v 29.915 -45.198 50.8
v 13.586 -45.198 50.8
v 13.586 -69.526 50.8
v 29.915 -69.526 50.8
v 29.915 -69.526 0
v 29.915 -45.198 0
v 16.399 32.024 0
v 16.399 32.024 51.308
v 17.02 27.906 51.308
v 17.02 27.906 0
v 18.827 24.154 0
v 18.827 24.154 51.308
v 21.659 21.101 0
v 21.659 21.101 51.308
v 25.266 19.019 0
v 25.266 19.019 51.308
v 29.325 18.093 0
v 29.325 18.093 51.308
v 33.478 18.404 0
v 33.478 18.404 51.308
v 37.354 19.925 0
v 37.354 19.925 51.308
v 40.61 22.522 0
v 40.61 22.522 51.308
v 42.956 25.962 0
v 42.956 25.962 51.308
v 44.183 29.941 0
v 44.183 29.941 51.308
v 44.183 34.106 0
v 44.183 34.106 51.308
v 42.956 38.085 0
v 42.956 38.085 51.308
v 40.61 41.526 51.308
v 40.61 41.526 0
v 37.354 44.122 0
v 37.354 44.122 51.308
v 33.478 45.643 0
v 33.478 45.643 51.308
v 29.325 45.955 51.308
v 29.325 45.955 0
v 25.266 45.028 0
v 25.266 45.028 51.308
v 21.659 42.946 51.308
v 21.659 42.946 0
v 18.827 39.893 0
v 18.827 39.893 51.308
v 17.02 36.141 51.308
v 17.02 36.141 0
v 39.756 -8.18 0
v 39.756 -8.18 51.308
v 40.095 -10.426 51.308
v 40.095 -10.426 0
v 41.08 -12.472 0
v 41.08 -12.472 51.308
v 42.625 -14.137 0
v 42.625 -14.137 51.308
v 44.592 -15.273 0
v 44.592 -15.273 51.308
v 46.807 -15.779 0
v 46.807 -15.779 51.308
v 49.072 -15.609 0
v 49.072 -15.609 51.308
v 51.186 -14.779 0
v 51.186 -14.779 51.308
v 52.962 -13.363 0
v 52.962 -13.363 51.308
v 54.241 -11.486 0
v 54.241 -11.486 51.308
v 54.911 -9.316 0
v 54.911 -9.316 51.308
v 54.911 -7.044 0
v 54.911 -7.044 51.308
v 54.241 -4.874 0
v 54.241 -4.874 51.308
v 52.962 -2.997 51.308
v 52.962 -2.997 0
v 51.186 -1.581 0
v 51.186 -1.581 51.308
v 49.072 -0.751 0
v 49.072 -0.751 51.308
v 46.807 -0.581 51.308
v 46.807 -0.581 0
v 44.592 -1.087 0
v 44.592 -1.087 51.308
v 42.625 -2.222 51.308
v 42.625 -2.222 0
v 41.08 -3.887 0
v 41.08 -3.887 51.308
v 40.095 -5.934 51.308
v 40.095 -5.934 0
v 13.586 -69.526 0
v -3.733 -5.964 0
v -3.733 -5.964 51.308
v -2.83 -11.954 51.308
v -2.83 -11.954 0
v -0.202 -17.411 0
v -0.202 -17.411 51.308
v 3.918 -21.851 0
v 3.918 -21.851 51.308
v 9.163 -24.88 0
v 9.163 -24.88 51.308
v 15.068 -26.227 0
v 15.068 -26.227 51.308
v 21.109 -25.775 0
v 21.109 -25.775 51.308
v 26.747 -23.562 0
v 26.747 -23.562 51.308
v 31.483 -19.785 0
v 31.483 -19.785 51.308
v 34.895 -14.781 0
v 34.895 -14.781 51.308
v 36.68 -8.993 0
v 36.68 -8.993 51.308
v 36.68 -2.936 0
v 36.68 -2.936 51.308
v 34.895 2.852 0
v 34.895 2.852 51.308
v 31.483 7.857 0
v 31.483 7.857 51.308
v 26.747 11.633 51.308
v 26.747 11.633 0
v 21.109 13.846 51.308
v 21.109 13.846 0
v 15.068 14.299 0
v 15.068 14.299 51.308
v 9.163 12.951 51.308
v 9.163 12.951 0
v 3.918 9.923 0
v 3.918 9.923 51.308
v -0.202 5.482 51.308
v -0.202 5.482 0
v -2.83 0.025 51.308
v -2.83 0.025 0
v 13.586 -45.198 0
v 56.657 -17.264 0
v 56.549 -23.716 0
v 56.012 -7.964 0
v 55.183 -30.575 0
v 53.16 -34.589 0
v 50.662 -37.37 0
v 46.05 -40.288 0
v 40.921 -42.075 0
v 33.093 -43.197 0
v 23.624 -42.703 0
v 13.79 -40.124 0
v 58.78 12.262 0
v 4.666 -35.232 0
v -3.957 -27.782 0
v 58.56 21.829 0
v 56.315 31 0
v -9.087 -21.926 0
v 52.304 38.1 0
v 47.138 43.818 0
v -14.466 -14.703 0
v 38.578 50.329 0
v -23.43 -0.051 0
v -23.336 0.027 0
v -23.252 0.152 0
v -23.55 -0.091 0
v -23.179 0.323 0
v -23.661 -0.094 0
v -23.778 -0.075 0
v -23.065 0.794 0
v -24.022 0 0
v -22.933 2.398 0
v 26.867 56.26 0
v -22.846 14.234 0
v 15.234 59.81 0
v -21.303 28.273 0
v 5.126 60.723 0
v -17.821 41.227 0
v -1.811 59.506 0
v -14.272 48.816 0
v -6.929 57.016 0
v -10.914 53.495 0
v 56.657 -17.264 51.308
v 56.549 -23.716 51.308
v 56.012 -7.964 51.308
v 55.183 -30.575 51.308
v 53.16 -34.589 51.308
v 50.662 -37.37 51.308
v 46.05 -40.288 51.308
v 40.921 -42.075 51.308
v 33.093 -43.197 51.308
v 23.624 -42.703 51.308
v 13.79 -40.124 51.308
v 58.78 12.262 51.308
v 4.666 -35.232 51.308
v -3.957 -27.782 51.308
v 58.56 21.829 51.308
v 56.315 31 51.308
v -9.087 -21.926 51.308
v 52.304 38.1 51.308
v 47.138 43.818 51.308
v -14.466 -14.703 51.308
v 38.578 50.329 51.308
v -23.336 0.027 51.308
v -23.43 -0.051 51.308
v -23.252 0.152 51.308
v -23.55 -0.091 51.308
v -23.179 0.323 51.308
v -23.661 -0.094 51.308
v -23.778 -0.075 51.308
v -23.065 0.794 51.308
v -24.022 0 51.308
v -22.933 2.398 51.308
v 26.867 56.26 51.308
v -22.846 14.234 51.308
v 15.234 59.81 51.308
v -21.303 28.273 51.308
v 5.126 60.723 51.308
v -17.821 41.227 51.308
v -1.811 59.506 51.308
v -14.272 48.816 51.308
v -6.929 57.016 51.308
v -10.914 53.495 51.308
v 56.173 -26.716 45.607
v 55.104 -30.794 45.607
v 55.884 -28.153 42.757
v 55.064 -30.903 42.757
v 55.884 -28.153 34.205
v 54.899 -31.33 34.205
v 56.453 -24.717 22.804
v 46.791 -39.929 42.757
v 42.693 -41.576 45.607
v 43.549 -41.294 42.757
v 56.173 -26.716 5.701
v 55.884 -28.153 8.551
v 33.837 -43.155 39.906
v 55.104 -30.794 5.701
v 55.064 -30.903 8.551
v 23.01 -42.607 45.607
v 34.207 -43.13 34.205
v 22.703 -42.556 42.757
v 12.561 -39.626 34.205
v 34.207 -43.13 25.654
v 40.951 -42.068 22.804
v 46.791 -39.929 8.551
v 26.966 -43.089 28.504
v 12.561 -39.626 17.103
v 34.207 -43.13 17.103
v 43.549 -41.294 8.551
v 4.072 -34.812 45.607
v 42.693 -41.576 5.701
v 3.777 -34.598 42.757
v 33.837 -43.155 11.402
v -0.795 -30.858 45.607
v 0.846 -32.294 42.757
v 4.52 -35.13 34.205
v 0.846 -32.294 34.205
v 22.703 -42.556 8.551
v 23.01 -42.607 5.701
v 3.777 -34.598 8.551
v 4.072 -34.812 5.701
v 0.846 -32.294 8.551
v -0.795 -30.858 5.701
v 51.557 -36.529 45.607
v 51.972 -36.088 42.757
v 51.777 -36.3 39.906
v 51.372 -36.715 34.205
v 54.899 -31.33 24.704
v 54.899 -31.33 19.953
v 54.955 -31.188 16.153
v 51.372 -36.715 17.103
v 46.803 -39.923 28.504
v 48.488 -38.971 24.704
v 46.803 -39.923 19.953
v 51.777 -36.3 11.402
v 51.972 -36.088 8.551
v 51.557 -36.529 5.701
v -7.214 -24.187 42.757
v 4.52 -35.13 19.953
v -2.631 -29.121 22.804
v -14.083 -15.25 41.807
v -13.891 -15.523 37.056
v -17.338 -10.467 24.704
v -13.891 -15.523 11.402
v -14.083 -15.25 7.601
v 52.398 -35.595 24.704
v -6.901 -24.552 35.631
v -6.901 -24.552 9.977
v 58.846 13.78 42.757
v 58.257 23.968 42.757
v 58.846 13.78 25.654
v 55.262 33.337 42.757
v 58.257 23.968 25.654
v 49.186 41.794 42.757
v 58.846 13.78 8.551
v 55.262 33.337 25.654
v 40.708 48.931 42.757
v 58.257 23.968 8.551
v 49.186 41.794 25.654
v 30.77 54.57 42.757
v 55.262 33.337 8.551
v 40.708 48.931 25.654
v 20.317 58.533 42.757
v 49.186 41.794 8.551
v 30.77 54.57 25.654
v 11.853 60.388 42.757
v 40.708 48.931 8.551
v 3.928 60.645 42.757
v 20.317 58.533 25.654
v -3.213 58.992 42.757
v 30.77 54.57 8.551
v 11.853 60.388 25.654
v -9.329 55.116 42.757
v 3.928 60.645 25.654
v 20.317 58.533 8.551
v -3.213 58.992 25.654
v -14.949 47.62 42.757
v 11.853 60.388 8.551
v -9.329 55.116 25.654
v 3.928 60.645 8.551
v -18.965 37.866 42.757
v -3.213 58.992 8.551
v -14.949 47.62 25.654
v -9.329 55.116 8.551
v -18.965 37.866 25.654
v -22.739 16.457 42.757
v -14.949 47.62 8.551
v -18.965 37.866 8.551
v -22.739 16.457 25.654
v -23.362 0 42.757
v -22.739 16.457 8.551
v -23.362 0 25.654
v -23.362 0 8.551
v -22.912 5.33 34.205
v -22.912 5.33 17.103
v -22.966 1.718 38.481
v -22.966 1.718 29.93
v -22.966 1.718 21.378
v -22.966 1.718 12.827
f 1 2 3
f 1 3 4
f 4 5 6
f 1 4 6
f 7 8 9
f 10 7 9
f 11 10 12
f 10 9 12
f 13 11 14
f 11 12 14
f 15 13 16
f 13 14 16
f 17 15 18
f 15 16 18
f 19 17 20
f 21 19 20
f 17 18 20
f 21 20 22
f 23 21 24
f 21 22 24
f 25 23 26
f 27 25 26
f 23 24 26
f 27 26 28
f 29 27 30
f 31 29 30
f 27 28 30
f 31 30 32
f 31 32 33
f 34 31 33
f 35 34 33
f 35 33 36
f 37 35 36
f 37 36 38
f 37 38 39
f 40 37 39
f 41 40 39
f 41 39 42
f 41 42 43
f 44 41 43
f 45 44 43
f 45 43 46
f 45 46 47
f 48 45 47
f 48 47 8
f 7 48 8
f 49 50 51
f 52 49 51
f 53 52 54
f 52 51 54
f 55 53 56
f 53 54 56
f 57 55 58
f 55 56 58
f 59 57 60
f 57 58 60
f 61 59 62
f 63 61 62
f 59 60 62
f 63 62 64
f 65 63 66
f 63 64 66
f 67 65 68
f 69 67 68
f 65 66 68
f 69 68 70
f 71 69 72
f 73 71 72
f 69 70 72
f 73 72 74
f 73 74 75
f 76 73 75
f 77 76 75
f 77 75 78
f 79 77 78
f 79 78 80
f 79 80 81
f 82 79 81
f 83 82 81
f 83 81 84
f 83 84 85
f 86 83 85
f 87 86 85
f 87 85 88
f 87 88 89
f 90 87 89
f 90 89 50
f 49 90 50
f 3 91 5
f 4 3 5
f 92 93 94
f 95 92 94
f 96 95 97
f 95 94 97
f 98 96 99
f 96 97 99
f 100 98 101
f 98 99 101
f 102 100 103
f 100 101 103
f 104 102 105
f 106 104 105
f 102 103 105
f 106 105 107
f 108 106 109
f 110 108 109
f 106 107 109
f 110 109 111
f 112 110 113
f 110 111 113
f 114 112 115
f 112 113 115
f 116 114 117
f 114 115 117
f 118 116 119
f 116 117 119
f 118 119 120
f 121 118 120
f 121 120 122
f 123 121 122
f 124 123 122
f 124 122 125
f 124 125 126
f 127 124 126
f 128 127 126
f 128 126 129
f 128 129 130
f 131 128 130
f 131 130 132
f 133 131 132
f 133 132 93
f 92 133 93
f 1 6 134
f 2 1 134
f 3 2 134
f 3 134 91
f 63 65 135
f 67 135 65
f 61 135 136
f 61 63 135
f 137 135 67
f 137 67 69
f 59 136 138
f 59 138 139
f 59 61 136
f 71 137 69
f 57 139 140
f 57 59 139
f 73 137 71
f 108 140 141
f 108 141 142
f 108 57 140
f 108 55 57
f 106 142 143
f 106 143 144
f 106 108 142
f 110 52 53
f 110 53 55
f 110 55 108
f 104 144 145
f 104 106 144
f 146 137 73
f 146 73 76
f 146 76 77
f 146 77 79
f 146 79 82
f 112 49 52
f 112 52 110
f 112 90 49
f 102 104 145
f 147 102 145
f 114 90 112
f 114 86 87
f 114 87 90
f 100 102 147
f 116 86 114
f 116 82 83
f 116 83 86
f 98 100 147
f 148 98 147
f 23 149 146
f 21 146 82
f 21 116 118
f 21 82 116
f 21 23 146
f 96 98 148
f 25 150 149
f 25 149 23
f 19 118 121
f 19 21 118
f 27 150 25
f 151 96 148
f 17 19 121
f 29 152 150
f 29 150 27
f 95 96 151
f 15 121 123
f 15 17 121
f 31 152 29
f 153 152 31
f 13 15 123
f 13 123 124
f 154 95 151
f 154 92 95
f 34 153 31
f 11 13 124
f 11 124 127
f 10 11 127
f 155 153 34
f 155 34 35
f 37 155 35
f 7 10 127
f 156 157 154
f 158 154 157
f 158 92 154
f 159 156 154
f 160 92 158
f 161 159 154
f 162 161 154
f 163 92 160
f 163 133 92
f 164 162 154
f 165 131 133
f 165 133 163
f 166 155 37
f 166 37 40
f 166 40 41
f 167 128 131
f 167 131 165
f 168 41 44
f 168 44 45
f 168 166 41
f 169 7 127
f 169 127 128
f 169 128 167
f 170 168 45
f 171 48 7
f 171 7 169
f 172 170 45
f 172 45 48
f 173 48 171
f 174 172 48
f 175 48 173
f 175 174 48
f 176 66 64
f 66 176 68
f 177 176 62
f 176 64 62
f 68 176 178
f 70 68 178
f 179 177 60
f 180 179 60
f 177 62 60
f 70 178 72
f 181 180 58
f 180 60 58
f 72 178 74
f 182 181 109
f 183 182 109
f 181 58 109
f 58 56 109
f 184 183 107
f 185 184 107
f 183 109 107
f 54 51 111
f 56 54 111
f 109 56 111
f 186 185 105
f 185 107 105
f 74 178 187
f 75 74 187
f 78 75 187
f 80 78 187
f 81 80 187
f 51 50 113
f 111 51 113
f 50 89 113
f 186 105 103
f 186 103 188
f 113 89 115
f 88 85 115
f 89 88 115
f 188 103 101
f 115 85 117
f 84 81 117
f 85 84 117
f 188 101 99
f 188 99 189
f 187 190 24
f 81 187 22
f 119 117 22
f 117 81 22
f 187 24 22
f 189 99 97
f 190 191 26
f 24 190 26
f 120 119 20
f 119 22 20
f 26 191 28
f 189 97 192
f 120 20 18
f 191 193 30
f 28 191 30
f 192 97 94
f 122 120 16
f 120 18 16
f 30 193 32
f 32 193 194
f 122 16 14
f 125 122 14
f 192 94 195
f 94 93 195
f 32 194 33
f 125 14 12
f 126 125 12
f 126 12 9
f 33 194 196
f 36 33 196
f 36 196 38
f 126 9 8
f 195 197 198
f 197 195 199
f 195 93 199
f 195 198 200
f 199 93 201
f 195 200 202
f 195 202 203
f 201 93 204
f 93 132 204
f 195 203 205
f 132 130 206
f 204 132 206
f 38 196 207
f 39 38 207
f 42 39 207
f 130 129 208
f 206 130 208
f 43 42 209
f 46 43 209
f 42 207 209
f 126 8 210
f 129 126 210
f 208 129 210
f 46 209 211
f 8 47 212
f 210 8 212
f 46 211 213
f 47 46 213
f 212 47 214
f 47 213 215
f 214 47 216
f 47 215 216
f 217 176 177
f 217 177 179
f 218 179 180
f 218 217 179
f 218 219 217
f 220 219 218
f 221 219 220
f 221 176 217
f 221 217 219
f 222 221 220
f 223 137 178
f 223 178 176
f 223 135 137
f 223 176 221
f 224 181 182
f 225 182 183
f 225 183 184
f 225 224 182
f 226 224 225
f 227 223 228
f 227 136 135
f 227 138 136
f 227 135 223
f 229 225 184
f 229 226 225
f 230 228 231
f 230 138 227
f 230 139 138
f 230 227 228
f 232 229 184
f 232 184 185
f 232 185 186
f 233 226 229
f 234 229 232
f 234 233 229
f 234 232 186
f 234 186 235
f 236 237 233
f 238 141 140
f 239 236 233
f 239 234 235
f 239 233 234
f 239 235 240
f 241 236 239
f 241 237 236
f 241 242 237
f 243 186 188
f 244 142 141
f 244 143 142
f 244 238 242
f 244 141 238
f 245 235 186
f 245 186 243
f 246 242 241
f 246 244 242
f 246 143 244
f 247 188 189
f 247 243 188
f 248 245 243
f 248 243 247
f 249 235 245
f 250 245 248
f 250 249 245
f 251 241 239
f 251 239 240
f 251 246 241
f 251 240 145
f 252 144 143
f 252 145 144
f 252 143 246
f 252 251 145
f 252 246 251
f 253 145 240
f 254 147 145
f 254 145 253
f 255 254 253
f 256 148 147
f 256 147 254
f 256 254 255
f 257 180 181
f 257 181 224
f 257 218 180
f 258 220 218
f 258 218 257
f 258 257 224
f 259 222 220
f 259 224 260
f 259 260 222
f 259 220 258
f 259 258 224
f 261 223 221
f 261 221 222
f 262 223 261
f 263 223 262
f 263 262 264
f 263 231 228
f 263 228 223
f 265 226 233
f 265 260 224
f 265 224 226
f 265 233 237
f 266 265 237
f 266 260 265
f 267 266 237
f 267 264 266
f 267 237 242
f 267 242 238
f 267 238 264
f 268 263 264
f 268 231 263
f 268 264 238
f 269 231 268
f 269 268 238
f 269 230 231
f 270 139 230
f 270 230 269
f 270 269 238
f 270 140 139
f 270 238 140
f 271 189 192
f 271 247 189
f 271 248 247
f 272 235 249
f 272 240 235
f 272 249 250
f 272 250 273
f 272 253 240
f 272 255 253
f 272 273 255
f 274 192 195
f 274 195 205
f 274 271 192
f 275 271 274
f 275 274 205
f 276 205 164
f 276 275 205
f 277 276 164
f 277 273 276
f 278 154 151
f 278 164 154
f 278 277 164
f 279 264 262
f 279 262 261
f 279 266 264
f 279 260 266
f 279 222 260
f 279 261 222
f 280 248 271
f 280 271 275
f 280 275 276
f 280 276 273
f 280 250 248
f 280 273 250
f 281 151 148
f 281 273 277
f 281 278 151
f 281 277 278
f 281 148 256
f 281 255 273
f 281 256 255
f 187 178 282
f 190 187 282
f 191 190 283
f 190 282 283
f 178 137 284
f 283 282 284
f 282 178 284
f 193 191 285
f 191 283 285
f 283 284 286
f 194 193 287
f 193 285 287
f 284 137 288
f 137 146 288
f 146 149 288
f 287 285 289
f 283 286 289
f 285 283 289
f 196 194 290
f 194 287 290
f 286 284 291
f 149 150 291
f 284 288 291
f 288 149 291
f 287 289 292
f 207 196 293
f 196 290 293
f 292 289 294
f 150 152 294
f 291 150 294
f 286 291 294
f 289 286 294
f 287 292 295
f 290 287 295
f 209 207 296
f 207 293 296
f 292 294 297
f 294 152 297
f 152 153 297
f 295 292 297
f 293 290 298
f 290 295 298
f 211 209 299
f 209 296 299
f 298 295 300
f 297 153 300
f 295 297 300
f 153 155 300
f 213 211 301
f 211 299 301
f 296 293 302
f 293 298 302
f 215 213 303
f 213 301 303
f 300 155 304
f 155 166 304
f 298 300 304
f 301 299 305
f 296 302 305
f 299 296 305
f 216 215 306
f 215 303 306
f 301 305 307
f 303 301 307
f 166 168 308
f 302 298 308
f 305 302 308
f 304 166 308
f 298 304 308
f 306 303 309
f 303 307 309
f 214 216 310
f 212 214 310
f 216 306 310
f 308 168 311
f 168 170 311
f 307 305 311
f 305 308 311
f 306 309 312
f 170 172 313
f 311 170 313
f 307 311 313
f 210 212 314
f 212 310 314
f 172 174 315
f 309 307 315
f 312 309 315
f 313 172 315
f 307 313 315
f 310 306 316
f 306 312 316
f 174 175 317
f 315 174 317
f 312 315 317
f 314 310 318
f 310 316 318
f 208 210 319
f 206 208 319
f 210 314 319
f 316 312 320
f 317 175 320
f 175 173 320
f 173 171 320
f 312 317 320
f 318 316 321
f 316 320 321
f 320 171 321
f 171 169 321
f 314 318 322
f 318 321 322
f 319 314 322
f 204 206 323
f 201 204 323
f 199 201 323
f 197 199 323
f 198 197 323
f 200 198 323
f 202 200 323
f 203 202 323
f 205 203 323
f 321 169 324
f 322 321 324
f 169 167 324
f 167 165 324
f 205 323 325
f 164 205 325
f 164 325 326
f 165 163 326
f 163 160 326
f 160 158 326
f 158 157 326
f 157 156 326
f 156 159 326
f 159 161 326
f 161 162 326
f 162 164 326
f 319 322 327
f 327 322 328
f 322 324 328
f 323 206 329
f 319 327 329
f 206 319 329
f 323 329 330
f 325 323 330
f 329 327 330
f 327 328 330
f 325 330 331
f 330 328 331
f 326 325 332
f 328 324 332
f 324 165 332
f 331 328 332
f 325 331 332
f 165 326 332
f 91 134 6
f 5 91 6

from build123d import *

# Parameters (mm, degrees)
F1_DEPTH = 51.308
F3_D     = 40.64
F5_D     = 15.24
F7_D     = 27.94
F9_DEPTH = 50.8


with BuildPart() as f1:
    # F0 (on Top) → F1 (new body)
    with BuildSketch(Plane.XY):
        with BuildLine():
            add(Edge.make_bspline(
                [(56.0124404728, -7.9644387588), (56.9753590395, -19.1102463597), (59.0514475401, -43.1410250669), (5.3467472158, -46.7995741419), (-13.7153867683, -16.4237299021), (-24.0219756961, 0)],
                knots=[0, 0, 0, 0, 0.284344005, 0.6130563262, 1, 1, 1, 1], degree=3))
            add(Edge.make_bspline(
                [(56.0124404728, -7.9644387588), (58.6142836782, 6.7744605313), (63.873201795, 36.5651352116), (21.6916803423, 61.9672567425), (-14.5502762604, 61.8700733376), (-24.4595201188, 19.0299783517), (-22.3291566988, -0.582370954), (-23.7799796516, -0.0832525318), (-24.0219756961, 0)],
                knots=[0, 0, 0, 0, 0.2162506935, 0.4370919382, 0.6208959046, 0.8361237682, 0.9726655828, 1, 1, 1, 1], degree=3))
        make_face()
    extrude(amount=F1_DEPTH)

    # F3 (through all)
    with Locations(Plane(origin=(0, 0, 0), x_dir=(1, 0, 0), z_dir=(0, 0, -1))):
        with Locations((16.5869705379, 5.9642544948)):
            Hole(F3_D / 2)

    # F5 (through all)
    with Locations(Plane(origin=(0, 0, 0), x_dir=(1, 0, 0), z_dir=(0, 0, -1))):
        with Locations((47.3761111498, 8.1799058244)):
            Hole(F5_D / 2)

    # F7 (through all)
    with Locations(Plane(origin=(0, 0, 0), x_dir=(1, 0, 0), z_dir=(0, 0, -1))):
        with Locations((30.3693879396, -32.0235900581)):
            Hole(F7_D / 2)


with BuildPart() as f9:
    # F8 (on Top) → F9 (new body)
    with BuildSketch(Plane.XY):
        Polygon((29.9152564257, -69.5262998343), (29.9152564257, -45.1982915401), (18.3138735592, -45.1982915401), (13.5864624754, -45.1982915401), (13.5864624754, -69.5262998343), align=None)
    extrude(amount=F9_DEPTH)


solid = Compound([f1.part, f9.part])
